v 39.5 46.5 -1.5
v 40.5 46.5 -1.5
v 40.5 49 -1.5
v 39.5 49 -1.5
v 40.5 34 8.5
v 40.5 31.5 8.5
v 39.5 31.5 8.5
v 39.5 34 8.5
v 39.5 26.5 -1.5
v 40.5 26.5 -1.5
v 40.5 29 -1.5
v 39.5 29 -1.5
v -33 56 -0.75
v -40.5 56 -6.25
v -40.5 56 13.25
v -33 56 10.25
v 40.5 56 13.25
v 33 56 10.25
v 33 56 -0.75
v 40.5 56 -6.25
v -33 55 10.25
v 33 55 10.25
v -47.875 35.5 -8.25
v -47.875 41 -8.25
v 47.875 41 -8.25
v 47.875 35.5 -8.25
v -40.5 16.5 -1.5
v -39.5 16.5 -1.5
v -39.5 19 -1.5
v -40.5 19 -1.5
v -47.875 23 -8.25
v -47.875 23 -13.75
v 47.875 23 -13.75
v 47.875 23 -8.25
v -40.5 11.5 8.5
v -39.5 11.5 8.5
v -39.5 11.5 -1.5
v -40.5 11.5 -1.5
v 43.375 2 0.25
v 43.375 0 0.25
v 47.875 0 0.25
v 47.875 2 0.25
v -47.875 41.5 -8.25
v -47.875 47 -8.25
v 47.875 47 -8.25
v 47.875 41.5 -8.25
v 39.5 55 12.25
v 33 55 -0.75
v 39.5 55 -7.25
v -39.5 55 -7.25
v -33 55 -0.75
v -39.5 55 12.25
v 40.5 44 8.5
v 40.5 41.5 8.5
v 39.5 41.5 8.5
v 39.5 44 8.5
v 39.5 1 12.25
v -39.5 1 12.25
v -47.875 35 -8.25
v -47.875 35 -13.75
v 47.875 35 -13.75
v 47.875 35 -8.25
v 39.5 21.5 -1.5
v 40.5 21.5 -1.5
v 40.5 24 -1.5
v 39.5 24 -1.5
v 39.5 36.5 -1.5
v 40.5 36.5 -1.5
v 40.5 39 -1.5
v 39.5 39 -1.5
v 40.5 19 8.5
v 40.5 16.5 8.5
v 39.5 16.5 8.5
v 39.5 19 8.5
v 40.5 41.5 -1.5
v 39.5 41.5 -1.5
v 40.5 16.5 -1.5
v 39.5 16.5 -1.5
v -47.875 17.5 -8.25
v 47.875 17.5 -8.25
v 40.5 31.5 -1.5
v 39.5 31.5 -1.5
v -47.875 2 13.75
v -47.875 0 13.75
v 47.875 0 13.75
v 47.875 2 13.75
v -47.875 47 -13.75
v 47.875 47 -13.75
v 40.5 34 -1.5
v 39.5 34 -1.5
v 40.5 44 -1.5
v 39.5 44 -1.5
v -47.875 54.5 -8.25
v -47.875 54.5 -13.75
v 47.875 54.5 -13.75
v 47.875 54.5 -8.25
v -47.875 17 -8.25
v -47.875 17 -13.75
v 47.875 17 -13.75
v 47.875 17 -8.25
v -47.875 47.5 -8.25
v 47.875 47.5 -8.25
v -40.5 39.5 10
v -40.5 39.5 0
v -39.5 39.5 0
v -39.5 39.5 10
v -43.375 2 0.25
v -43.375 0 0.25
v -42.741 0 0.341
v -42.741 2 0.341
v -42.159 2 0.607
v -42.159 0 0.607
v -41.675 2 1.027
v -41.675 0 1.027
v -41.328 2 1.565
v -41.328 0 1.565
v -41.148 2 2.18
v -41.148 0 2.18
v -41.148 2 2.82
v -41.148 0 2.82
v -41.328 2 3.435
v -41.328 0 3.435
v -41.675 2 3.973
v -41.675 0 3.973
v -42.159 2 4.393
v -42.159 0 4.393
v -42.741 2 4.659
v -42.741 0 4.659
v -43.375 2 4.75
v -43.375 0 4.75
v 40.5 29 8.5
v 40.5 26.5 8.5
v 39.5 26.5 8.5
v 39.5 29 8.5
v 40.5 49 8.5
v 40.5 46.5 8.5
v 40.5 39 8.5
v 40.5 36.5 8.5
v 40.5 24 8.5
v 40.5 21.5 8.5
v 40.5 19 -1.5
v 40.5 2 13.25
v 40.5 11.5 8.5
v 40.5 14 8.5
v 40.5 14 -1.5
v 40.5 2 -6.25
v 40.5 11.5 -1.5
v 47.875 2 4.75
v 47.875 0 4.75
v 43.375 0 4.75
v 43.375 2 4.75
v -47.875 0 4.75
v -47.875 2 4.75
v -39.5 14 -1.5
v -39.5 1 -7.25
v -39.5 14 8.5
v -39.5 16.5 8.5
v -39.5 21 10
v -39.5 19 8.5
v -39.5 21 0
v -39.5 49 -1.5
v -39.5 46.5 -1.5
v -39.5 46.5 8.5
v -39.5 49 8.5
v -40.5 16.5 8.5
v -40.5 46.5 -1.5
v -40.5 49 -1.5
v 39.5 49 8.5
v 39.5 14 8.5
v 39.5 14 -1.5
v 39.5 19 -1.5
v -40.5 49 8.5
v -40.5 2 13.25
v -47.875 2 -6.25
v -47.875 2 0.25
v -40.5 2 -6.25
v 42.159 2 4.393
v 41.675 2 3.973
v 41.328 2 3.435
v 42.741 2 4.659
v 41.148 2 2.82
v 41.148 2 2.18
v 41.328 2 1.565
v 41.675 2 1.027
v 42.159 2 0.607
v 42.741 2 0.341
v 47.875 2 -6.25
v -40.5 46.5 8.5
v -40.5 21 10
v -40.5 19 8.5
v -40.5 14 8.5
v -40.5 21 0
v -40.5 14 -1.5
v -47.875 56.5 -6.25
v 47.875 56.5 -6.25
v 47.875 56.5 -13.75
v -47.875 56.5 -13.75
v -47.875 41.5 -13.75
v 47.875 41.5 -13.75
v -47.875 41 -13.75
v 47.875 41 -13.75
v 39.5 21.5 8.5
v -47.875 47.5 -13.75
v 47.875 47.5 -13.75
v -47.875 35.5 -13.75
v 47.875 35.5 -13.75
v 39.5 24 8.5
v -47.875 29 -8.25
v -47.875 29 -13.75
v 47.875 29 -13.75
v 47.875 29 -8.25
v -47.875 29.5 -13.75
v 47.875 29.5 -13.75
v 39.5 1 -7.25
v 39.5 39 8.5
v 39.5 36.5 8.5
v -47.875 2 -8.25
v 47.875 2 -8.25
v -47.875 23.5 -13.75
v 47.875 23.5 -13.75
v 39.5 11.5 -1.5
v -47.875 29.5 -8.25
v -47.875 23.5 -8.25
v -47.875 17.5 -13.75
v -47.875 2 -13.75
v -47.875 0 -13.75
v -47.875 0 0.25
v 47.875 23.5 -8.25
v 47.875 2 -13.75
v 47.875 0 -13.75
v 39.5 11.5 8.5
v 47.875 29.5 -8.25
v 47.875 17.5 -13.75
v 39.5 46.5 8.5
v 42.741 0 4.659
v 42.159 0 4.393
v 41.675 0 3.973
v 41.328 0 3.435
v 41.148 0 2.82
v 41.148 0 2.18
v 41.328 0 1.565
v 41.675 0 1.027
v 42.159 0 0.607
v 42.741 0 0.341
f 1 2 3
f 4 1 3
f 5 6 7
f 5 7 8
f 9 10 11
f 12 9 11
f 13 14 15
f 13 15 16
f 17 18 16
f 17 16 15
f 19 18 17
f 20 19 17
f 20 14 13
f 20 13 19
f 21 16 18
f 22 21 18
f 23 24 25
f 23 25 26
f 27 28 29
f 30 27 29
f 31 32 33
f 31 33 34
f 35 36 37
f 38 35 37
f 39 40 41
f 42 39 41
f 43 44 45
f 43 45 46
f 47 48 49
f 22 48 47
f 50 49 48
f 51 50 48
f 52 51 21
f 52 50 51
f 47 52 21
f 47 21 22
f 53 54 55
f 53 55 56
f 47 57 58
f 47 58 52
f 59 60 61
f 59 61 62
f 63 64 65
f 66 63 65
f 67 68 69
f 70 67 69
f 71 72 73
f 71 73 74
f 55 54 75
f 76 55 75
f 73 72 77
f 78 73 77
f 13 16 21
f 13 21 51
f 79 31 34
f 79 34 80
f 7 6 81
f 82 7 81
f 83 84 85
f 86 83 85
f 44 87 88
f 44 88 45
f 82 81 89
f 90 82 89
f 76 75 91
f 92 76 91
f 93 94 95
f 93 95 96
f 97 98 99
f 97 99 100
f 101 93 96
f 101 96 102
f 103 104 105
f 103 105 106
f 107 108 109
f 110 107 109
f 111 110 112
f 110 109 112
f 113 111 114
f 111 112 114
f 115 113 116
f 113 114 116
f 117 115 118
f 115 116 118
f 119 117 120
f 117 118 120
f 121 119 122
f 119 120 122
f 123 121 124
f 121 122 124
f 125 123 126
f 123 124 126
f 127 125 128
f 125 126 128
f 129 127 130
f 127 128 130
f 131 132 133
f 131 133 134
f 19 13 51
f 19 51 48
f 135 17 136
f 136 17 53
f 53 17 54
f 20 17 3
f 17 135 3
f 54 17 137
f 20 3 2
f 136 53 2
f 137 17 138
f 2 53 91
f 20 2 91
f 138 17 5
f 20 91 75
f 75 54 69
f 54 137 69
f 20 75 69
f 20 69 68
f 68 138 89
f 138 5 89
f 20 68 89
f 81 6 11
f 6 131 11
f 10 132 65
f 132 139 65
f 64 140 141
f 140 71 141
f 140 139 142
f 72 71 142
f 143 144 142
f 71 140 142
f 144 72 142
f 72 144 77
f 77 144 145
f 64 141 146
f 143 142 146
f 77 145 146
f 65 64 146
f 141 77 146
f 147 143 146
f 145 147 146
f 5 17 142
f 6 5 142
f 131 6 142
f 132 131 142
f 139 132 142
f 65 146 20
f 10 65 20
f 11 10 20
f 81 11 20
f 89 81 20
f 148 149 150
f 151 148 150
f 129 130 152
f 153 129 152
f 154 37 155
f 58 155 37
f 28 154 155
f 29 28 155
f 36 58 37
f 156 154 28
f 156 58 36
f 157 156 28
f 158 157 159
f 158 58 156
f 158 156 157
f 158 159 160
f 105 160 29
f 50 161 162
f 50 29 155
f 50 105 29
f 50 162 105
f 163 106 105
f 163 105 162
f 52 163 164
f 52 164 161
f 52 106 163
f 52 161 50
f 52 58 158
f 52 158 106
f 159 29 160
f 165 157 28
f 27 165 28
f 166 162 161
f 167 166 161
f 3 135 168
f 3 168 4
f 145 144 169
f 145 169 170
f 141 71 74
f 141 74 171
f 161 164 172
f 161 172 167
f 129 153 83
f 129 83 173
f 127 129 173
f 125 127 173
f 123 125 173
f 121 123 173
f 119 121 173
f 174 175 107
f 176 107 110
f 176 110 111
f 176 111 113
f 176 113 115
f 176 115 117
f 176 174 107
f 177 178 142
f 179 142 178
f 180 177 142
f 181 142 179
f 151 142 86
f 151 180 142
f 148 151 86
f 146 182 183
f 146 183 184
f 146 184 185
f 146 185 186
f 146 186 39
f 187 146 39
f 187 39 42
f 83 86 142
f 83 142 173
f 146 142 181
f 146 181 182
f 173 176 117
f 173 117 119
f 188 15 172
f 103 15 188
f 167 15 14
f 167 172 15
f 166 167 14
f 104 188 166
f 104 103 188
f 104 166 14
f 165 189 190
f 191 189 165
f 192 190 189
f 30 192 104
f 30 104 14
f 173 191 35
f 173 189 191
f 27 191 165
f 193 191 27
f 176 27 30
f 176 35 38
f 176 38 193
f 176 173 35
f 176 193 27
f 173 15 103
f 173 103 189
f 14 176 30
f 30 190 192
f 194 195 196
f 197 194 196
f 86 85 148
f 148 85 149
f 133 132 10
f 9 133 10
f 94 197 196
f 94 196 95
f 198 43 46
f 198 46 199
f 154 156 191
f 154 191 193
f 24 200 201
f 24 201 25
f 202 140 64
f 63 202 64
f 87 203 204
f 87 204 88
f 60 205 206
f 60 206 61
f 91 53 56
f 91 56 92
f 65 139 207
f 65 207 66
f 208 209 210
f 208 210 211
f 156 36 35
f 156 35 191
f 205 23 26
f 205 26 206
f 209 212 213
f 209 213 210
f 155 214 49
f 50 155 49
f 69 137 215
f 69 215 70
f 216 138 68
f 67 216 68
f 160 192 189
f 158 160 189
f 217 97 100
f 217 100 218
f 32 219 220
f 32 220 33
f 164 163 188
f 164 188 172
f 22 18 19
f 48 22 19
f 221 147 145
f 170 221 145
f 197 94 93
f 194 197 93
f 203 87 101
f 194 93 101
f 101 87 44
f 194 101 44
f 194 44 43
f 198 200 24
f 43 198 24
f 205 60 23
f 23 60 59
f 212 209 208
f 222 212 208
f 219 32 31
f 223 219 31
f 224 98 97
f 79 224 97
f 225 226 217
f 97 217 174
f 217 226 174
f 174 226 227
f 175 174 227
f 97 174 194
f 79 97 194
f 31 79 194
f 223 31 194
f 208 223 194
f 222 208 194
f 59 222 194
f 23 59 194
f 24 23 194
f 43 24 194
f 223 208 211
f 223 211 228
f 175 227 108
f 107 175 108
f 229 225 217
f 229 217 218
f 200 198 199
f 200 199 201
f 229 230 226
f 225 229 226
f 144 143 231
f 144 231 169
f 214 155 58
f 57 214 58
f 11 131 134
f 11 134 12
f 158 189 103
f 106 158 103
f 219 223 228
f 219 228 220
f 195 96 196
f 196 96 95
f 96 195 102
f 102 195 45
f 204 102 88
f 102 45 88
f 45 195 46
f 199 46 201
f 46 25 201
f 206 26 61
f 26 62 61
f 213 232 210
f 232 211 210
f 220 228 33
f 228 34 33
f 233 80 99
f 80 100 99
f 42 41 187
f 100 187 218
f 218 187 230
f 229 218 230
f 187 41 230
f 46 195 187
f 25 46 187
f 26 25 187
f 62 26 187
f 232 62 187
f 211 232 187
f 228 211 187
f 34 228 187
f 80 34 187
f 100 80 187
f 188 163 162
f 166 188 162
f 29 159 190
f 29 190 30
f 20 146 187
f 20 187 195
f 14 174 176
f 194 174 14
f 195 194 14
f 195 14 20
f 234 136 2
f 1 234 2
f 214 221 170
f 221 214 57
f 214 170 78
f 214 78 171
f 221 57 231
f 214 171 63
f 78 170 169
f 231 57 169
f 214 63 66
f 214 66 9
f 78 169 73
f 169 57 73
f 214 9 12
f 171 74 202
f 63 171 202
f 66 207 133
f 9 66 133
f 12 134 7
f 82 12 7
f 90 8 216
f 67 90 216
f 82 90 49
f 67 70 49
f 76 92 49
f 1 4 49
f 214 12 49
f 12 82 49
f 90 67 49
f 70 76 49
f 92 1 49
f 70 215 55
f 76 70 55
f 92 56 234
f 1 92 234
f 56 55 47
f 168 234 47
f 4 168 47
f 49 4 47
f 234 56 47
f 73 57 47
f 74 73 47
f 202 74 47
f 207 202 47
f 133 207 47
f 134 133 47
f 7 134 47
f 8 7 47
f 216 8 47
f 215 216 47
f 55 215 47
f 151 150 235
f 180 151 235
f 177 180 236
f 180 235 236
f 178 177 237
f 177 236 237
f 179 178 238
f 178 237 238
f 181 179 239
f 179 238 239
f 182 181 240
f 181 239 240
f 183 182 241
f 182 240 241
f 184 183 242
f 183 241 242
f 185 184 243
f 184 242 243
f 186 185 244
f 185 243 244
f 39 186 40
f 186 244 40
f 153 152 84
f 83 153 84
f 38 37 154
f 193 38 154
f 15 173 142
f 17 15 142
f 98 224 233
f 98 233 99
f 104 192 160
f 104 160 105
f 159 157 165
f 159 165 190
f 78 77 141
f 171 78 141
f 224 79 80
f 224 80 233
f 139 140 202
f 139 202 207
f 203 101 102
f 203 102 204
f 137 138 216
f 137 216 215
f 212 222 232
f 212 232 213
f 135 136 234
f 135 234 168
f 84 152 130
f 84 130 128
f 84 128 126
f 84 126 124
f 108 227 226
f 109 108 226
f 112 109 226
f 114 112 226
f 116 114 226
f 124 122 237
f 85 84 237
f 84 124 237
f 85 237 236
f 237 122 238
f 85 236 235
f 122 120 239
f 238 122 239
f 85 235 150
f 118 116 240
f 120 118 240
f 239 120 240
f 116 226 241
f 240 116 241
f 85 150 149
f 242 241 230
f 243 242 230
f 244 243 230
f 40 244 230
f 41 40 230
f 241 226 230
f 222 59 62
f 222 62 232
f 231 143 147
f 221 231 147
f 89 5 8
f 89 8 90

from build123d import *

# Parameters (mm, degrees)
BOSS_EXTRUDE1_DEPTH = 2
BOSS_EXTRUDE4_DEPTH = 95.75
SKETCH3_W           = 81
SKETCH3_H           = 19.5
BOSS_EXTRUDE5_DEPTH = 54
SKETCH4_W           = 10
SKETCH4_H           = 2.5
CUT_EXTRUDE1_DEPTH  = 1
SHELL1_START        = -39.5
SHELL1_OUTLINE_W    = 54
SHELL1_OUTLINE_H    = 19.5
SHELL1_DEPTH        = 79
SKETCH4_2_W         = 10
SKETCH4_2_H         = 2.5
CUT_EXTRUDE2_DEPTH  = 106.789664547
CUT_EXTRUDE3_REACH  = 107.79
SKETCH5_W           = 10
SKETCH5_H           = 18.5
SKETCH6_W           = 66
SKETCH6_H           = 11
CUT_EXTRUDE4_DEPTH  = 1


# Read off the part's stored shape, not the designer's step: Shell1
with BuildPart() as part:
    # Sketch1 → Boss-Extrude1 (new body)
    with BuildSketch(Plane(origin=(0, 0, 0), x_dir=(1, 0, 0), z_dir=(0, 1, 0))):
        with BuildLine():
            Line((-47.875, -4.75), (-47.875, -13.75))
            Line((-47.875, -13.75), (47.875, -13.75))
            Line((47.875, -13.75), (47.875, -4.75))
            Line((47.875, -4.75), (43.375, -4.75))
            ThreePointArc((43.375, -4.75), (41.125, -2.5), (43.375, -0.25))
            Line((43.375, -0.25), (47.875, -0.25))
            Line((47.875, -0.25), (47.875, 13.75))
            Line((47.875, 13.75), (-47.875, 13.75))
            Line((-47.875, 13.75), (-47.875, -0.25))
            Line((-47.875, -0.25), (-43.375, -0.25))
            ThreePointArc((-43.375, -0.25), (-41.125, -2.5), (-43.375, -4.75))
            Line((-43.375, -4.75), (-47.875, -4.75))
        make_face()
    extrude(amount=BOSS_EXTRUDE1_DEPTH)

    # Sketch2 → Boss-Extrude4 (add)
    with BuildSketch(Plane.ZY.offset(47.875)):
        Polygon((-13.75, 0), (-6.25, 0), (-6.25, 56.5), (-13.75, 56.5), (-13.75, 54.5), (-8.25, 54.5), (-8.25, 47.5), (-13.75, 47.5), (-13.75, 47), (-8.25, 47), (-8.25, 41.5), (-13.75, 41.5), (-13.75, 41), (-8.25, 41), (-8.25, 35.5), (-13.75, 35.5), (-13.75, 35), (-8.25, 35), (-8.25, 29.5), (-13.75, 29.5), (-13.75, 29), (-8.25, 29), (-8.25, 23.5), (-13.75, 23.5), (-13.75, 23), (-8.25, 23), (-8.25, 17.5), (-13.75, 17.5), (-13.75, 17), (-8.25, 17), (-8.25, 2), (-13.75, 2), align=None)
    extrude(amount=-BOSS_EXTRUDE4_DEPTH)

    # Sketch3 → Boss-Extrude5 (add)
    with BuildSketch(Plane(origin=(0, 2, 0), x_dir=(1, 0, 0), z_dir=(0, 1, 0))):
        with Locations((0, -3.5)):
            Rectangle(SKETCH3_W, SKETCH3_H)
    extrude(amount=BOSS_EXTRUDE5_DEPTH)

    # Sketch4 → Cut-Extrude1 (cut)
    with BuildSketch(Plane(origin=(40.5, 0, 0), x_dir=(0, 0, -1), z_dir=(1, 0, 0))):
        with Locations((-3.5, 47.75)):
            Rectangle(SKETCH4_W, SKETCH4_H)
        with Locations((-3.5, 42.75)):
            Rectangle(SKETCH4_W, SKETCH4_H)
        with Locations((-3.5, 37.75)):
            Rectangle(SKETCH4_W, SKETCH4_H)
        with Locations((-3.5, 32.75)):
            Rectangle(SKETCH4_W, SKETCH4_H)
        with Locations((-3.5, 27.75)):
            Rectangle(SKETCH4_W, SKETCH4_H)
        with Locations((-3.5, 22.75)):
            Rectangle(SKETCH4_W, SKETCH4_H)
        with Locations((-3.5, 17.75)):
            Rectangle(SKETCH4_W, SKETCH4_H)
        with Locations((-3.5, 12.75)):
            Rectangle(SKETCH4_W, SKETCH4_H)
    extrude(amount=-CUT_EXTRUDE1_DEPTH, mode=Mode.SUBTRACT)

    # Shell1 outline → Shell1 (cut)
    with BuildSketch(Plane.YZ.offset(SHELL1_START)):
        with Locations((28, 2.5)):
            Rectangle(SHELL1_OUTLINE_W, SHELL1_OUTLINE_H)
    extrude(amount=SHELL1_DEPTH, mode=Mode.SUBTRACT)

    # Sketch4<2> → Cut-Extrude2 (cut, through all)
    with BuildSketch(Plane(origin=(40.5, 0, 0), x_dir=(0, 0, -1), z_dir=(1, 0, 0))):
        with Locations((-3.5, 47.75)):
            Rectangle(SKETCH4_2_W, SKETCH4_2_H)
        with Locations((-3.5, 17.75)):
            Rectangle(SKETCH4_2_W, SKETCH4_2_H)
        with Locations((-3.5, 12.75)):
            Rectangle(SKETCH4_2_W, SKETCH4_2_H)
    extrude(amount=-CUT_EXTRUDE2_DEPTH, mode=Mode.SUBTRACT)

    # Sketch5 → Cut-Extrude3 (cut, up to next)
    with BuildSketch(Plane.ZY.offset(40.5), mode=Mode.PRIVATE) as cut_extrude3_sk1:
        with Locations((5, 30.25)):
            Rectangle(SKETCH5_W, SKETCH5_H)
    cut_extrude3_tool1 = extrude(cut_extrude3_sk1.sketch, amount=-CUT_EXTRUDE3_REACH, mode=Mode.PRIVATE) & part.part
    add(cut_extrude3_tool1.solids().sort_by_distance((-40.5, 30.25, 5))[0], mode=Mode.SUBTRACT)

    # Sketch6 → Cut-Extrude4 (cut)
    with BuildSketch(Plane(origin=(0, 56, 0), x_dir=(1, 0, 0), z_dir=(0, 1, 0))):
        with Locations((0, -4.75)):
            Rectangle(SKETCH6_W, SKETCH6_H)
    extrude(amount=-CUT_EXTRUDE4_DEPTH, mode=Mode.SUBTRACT)


solid = part.part
